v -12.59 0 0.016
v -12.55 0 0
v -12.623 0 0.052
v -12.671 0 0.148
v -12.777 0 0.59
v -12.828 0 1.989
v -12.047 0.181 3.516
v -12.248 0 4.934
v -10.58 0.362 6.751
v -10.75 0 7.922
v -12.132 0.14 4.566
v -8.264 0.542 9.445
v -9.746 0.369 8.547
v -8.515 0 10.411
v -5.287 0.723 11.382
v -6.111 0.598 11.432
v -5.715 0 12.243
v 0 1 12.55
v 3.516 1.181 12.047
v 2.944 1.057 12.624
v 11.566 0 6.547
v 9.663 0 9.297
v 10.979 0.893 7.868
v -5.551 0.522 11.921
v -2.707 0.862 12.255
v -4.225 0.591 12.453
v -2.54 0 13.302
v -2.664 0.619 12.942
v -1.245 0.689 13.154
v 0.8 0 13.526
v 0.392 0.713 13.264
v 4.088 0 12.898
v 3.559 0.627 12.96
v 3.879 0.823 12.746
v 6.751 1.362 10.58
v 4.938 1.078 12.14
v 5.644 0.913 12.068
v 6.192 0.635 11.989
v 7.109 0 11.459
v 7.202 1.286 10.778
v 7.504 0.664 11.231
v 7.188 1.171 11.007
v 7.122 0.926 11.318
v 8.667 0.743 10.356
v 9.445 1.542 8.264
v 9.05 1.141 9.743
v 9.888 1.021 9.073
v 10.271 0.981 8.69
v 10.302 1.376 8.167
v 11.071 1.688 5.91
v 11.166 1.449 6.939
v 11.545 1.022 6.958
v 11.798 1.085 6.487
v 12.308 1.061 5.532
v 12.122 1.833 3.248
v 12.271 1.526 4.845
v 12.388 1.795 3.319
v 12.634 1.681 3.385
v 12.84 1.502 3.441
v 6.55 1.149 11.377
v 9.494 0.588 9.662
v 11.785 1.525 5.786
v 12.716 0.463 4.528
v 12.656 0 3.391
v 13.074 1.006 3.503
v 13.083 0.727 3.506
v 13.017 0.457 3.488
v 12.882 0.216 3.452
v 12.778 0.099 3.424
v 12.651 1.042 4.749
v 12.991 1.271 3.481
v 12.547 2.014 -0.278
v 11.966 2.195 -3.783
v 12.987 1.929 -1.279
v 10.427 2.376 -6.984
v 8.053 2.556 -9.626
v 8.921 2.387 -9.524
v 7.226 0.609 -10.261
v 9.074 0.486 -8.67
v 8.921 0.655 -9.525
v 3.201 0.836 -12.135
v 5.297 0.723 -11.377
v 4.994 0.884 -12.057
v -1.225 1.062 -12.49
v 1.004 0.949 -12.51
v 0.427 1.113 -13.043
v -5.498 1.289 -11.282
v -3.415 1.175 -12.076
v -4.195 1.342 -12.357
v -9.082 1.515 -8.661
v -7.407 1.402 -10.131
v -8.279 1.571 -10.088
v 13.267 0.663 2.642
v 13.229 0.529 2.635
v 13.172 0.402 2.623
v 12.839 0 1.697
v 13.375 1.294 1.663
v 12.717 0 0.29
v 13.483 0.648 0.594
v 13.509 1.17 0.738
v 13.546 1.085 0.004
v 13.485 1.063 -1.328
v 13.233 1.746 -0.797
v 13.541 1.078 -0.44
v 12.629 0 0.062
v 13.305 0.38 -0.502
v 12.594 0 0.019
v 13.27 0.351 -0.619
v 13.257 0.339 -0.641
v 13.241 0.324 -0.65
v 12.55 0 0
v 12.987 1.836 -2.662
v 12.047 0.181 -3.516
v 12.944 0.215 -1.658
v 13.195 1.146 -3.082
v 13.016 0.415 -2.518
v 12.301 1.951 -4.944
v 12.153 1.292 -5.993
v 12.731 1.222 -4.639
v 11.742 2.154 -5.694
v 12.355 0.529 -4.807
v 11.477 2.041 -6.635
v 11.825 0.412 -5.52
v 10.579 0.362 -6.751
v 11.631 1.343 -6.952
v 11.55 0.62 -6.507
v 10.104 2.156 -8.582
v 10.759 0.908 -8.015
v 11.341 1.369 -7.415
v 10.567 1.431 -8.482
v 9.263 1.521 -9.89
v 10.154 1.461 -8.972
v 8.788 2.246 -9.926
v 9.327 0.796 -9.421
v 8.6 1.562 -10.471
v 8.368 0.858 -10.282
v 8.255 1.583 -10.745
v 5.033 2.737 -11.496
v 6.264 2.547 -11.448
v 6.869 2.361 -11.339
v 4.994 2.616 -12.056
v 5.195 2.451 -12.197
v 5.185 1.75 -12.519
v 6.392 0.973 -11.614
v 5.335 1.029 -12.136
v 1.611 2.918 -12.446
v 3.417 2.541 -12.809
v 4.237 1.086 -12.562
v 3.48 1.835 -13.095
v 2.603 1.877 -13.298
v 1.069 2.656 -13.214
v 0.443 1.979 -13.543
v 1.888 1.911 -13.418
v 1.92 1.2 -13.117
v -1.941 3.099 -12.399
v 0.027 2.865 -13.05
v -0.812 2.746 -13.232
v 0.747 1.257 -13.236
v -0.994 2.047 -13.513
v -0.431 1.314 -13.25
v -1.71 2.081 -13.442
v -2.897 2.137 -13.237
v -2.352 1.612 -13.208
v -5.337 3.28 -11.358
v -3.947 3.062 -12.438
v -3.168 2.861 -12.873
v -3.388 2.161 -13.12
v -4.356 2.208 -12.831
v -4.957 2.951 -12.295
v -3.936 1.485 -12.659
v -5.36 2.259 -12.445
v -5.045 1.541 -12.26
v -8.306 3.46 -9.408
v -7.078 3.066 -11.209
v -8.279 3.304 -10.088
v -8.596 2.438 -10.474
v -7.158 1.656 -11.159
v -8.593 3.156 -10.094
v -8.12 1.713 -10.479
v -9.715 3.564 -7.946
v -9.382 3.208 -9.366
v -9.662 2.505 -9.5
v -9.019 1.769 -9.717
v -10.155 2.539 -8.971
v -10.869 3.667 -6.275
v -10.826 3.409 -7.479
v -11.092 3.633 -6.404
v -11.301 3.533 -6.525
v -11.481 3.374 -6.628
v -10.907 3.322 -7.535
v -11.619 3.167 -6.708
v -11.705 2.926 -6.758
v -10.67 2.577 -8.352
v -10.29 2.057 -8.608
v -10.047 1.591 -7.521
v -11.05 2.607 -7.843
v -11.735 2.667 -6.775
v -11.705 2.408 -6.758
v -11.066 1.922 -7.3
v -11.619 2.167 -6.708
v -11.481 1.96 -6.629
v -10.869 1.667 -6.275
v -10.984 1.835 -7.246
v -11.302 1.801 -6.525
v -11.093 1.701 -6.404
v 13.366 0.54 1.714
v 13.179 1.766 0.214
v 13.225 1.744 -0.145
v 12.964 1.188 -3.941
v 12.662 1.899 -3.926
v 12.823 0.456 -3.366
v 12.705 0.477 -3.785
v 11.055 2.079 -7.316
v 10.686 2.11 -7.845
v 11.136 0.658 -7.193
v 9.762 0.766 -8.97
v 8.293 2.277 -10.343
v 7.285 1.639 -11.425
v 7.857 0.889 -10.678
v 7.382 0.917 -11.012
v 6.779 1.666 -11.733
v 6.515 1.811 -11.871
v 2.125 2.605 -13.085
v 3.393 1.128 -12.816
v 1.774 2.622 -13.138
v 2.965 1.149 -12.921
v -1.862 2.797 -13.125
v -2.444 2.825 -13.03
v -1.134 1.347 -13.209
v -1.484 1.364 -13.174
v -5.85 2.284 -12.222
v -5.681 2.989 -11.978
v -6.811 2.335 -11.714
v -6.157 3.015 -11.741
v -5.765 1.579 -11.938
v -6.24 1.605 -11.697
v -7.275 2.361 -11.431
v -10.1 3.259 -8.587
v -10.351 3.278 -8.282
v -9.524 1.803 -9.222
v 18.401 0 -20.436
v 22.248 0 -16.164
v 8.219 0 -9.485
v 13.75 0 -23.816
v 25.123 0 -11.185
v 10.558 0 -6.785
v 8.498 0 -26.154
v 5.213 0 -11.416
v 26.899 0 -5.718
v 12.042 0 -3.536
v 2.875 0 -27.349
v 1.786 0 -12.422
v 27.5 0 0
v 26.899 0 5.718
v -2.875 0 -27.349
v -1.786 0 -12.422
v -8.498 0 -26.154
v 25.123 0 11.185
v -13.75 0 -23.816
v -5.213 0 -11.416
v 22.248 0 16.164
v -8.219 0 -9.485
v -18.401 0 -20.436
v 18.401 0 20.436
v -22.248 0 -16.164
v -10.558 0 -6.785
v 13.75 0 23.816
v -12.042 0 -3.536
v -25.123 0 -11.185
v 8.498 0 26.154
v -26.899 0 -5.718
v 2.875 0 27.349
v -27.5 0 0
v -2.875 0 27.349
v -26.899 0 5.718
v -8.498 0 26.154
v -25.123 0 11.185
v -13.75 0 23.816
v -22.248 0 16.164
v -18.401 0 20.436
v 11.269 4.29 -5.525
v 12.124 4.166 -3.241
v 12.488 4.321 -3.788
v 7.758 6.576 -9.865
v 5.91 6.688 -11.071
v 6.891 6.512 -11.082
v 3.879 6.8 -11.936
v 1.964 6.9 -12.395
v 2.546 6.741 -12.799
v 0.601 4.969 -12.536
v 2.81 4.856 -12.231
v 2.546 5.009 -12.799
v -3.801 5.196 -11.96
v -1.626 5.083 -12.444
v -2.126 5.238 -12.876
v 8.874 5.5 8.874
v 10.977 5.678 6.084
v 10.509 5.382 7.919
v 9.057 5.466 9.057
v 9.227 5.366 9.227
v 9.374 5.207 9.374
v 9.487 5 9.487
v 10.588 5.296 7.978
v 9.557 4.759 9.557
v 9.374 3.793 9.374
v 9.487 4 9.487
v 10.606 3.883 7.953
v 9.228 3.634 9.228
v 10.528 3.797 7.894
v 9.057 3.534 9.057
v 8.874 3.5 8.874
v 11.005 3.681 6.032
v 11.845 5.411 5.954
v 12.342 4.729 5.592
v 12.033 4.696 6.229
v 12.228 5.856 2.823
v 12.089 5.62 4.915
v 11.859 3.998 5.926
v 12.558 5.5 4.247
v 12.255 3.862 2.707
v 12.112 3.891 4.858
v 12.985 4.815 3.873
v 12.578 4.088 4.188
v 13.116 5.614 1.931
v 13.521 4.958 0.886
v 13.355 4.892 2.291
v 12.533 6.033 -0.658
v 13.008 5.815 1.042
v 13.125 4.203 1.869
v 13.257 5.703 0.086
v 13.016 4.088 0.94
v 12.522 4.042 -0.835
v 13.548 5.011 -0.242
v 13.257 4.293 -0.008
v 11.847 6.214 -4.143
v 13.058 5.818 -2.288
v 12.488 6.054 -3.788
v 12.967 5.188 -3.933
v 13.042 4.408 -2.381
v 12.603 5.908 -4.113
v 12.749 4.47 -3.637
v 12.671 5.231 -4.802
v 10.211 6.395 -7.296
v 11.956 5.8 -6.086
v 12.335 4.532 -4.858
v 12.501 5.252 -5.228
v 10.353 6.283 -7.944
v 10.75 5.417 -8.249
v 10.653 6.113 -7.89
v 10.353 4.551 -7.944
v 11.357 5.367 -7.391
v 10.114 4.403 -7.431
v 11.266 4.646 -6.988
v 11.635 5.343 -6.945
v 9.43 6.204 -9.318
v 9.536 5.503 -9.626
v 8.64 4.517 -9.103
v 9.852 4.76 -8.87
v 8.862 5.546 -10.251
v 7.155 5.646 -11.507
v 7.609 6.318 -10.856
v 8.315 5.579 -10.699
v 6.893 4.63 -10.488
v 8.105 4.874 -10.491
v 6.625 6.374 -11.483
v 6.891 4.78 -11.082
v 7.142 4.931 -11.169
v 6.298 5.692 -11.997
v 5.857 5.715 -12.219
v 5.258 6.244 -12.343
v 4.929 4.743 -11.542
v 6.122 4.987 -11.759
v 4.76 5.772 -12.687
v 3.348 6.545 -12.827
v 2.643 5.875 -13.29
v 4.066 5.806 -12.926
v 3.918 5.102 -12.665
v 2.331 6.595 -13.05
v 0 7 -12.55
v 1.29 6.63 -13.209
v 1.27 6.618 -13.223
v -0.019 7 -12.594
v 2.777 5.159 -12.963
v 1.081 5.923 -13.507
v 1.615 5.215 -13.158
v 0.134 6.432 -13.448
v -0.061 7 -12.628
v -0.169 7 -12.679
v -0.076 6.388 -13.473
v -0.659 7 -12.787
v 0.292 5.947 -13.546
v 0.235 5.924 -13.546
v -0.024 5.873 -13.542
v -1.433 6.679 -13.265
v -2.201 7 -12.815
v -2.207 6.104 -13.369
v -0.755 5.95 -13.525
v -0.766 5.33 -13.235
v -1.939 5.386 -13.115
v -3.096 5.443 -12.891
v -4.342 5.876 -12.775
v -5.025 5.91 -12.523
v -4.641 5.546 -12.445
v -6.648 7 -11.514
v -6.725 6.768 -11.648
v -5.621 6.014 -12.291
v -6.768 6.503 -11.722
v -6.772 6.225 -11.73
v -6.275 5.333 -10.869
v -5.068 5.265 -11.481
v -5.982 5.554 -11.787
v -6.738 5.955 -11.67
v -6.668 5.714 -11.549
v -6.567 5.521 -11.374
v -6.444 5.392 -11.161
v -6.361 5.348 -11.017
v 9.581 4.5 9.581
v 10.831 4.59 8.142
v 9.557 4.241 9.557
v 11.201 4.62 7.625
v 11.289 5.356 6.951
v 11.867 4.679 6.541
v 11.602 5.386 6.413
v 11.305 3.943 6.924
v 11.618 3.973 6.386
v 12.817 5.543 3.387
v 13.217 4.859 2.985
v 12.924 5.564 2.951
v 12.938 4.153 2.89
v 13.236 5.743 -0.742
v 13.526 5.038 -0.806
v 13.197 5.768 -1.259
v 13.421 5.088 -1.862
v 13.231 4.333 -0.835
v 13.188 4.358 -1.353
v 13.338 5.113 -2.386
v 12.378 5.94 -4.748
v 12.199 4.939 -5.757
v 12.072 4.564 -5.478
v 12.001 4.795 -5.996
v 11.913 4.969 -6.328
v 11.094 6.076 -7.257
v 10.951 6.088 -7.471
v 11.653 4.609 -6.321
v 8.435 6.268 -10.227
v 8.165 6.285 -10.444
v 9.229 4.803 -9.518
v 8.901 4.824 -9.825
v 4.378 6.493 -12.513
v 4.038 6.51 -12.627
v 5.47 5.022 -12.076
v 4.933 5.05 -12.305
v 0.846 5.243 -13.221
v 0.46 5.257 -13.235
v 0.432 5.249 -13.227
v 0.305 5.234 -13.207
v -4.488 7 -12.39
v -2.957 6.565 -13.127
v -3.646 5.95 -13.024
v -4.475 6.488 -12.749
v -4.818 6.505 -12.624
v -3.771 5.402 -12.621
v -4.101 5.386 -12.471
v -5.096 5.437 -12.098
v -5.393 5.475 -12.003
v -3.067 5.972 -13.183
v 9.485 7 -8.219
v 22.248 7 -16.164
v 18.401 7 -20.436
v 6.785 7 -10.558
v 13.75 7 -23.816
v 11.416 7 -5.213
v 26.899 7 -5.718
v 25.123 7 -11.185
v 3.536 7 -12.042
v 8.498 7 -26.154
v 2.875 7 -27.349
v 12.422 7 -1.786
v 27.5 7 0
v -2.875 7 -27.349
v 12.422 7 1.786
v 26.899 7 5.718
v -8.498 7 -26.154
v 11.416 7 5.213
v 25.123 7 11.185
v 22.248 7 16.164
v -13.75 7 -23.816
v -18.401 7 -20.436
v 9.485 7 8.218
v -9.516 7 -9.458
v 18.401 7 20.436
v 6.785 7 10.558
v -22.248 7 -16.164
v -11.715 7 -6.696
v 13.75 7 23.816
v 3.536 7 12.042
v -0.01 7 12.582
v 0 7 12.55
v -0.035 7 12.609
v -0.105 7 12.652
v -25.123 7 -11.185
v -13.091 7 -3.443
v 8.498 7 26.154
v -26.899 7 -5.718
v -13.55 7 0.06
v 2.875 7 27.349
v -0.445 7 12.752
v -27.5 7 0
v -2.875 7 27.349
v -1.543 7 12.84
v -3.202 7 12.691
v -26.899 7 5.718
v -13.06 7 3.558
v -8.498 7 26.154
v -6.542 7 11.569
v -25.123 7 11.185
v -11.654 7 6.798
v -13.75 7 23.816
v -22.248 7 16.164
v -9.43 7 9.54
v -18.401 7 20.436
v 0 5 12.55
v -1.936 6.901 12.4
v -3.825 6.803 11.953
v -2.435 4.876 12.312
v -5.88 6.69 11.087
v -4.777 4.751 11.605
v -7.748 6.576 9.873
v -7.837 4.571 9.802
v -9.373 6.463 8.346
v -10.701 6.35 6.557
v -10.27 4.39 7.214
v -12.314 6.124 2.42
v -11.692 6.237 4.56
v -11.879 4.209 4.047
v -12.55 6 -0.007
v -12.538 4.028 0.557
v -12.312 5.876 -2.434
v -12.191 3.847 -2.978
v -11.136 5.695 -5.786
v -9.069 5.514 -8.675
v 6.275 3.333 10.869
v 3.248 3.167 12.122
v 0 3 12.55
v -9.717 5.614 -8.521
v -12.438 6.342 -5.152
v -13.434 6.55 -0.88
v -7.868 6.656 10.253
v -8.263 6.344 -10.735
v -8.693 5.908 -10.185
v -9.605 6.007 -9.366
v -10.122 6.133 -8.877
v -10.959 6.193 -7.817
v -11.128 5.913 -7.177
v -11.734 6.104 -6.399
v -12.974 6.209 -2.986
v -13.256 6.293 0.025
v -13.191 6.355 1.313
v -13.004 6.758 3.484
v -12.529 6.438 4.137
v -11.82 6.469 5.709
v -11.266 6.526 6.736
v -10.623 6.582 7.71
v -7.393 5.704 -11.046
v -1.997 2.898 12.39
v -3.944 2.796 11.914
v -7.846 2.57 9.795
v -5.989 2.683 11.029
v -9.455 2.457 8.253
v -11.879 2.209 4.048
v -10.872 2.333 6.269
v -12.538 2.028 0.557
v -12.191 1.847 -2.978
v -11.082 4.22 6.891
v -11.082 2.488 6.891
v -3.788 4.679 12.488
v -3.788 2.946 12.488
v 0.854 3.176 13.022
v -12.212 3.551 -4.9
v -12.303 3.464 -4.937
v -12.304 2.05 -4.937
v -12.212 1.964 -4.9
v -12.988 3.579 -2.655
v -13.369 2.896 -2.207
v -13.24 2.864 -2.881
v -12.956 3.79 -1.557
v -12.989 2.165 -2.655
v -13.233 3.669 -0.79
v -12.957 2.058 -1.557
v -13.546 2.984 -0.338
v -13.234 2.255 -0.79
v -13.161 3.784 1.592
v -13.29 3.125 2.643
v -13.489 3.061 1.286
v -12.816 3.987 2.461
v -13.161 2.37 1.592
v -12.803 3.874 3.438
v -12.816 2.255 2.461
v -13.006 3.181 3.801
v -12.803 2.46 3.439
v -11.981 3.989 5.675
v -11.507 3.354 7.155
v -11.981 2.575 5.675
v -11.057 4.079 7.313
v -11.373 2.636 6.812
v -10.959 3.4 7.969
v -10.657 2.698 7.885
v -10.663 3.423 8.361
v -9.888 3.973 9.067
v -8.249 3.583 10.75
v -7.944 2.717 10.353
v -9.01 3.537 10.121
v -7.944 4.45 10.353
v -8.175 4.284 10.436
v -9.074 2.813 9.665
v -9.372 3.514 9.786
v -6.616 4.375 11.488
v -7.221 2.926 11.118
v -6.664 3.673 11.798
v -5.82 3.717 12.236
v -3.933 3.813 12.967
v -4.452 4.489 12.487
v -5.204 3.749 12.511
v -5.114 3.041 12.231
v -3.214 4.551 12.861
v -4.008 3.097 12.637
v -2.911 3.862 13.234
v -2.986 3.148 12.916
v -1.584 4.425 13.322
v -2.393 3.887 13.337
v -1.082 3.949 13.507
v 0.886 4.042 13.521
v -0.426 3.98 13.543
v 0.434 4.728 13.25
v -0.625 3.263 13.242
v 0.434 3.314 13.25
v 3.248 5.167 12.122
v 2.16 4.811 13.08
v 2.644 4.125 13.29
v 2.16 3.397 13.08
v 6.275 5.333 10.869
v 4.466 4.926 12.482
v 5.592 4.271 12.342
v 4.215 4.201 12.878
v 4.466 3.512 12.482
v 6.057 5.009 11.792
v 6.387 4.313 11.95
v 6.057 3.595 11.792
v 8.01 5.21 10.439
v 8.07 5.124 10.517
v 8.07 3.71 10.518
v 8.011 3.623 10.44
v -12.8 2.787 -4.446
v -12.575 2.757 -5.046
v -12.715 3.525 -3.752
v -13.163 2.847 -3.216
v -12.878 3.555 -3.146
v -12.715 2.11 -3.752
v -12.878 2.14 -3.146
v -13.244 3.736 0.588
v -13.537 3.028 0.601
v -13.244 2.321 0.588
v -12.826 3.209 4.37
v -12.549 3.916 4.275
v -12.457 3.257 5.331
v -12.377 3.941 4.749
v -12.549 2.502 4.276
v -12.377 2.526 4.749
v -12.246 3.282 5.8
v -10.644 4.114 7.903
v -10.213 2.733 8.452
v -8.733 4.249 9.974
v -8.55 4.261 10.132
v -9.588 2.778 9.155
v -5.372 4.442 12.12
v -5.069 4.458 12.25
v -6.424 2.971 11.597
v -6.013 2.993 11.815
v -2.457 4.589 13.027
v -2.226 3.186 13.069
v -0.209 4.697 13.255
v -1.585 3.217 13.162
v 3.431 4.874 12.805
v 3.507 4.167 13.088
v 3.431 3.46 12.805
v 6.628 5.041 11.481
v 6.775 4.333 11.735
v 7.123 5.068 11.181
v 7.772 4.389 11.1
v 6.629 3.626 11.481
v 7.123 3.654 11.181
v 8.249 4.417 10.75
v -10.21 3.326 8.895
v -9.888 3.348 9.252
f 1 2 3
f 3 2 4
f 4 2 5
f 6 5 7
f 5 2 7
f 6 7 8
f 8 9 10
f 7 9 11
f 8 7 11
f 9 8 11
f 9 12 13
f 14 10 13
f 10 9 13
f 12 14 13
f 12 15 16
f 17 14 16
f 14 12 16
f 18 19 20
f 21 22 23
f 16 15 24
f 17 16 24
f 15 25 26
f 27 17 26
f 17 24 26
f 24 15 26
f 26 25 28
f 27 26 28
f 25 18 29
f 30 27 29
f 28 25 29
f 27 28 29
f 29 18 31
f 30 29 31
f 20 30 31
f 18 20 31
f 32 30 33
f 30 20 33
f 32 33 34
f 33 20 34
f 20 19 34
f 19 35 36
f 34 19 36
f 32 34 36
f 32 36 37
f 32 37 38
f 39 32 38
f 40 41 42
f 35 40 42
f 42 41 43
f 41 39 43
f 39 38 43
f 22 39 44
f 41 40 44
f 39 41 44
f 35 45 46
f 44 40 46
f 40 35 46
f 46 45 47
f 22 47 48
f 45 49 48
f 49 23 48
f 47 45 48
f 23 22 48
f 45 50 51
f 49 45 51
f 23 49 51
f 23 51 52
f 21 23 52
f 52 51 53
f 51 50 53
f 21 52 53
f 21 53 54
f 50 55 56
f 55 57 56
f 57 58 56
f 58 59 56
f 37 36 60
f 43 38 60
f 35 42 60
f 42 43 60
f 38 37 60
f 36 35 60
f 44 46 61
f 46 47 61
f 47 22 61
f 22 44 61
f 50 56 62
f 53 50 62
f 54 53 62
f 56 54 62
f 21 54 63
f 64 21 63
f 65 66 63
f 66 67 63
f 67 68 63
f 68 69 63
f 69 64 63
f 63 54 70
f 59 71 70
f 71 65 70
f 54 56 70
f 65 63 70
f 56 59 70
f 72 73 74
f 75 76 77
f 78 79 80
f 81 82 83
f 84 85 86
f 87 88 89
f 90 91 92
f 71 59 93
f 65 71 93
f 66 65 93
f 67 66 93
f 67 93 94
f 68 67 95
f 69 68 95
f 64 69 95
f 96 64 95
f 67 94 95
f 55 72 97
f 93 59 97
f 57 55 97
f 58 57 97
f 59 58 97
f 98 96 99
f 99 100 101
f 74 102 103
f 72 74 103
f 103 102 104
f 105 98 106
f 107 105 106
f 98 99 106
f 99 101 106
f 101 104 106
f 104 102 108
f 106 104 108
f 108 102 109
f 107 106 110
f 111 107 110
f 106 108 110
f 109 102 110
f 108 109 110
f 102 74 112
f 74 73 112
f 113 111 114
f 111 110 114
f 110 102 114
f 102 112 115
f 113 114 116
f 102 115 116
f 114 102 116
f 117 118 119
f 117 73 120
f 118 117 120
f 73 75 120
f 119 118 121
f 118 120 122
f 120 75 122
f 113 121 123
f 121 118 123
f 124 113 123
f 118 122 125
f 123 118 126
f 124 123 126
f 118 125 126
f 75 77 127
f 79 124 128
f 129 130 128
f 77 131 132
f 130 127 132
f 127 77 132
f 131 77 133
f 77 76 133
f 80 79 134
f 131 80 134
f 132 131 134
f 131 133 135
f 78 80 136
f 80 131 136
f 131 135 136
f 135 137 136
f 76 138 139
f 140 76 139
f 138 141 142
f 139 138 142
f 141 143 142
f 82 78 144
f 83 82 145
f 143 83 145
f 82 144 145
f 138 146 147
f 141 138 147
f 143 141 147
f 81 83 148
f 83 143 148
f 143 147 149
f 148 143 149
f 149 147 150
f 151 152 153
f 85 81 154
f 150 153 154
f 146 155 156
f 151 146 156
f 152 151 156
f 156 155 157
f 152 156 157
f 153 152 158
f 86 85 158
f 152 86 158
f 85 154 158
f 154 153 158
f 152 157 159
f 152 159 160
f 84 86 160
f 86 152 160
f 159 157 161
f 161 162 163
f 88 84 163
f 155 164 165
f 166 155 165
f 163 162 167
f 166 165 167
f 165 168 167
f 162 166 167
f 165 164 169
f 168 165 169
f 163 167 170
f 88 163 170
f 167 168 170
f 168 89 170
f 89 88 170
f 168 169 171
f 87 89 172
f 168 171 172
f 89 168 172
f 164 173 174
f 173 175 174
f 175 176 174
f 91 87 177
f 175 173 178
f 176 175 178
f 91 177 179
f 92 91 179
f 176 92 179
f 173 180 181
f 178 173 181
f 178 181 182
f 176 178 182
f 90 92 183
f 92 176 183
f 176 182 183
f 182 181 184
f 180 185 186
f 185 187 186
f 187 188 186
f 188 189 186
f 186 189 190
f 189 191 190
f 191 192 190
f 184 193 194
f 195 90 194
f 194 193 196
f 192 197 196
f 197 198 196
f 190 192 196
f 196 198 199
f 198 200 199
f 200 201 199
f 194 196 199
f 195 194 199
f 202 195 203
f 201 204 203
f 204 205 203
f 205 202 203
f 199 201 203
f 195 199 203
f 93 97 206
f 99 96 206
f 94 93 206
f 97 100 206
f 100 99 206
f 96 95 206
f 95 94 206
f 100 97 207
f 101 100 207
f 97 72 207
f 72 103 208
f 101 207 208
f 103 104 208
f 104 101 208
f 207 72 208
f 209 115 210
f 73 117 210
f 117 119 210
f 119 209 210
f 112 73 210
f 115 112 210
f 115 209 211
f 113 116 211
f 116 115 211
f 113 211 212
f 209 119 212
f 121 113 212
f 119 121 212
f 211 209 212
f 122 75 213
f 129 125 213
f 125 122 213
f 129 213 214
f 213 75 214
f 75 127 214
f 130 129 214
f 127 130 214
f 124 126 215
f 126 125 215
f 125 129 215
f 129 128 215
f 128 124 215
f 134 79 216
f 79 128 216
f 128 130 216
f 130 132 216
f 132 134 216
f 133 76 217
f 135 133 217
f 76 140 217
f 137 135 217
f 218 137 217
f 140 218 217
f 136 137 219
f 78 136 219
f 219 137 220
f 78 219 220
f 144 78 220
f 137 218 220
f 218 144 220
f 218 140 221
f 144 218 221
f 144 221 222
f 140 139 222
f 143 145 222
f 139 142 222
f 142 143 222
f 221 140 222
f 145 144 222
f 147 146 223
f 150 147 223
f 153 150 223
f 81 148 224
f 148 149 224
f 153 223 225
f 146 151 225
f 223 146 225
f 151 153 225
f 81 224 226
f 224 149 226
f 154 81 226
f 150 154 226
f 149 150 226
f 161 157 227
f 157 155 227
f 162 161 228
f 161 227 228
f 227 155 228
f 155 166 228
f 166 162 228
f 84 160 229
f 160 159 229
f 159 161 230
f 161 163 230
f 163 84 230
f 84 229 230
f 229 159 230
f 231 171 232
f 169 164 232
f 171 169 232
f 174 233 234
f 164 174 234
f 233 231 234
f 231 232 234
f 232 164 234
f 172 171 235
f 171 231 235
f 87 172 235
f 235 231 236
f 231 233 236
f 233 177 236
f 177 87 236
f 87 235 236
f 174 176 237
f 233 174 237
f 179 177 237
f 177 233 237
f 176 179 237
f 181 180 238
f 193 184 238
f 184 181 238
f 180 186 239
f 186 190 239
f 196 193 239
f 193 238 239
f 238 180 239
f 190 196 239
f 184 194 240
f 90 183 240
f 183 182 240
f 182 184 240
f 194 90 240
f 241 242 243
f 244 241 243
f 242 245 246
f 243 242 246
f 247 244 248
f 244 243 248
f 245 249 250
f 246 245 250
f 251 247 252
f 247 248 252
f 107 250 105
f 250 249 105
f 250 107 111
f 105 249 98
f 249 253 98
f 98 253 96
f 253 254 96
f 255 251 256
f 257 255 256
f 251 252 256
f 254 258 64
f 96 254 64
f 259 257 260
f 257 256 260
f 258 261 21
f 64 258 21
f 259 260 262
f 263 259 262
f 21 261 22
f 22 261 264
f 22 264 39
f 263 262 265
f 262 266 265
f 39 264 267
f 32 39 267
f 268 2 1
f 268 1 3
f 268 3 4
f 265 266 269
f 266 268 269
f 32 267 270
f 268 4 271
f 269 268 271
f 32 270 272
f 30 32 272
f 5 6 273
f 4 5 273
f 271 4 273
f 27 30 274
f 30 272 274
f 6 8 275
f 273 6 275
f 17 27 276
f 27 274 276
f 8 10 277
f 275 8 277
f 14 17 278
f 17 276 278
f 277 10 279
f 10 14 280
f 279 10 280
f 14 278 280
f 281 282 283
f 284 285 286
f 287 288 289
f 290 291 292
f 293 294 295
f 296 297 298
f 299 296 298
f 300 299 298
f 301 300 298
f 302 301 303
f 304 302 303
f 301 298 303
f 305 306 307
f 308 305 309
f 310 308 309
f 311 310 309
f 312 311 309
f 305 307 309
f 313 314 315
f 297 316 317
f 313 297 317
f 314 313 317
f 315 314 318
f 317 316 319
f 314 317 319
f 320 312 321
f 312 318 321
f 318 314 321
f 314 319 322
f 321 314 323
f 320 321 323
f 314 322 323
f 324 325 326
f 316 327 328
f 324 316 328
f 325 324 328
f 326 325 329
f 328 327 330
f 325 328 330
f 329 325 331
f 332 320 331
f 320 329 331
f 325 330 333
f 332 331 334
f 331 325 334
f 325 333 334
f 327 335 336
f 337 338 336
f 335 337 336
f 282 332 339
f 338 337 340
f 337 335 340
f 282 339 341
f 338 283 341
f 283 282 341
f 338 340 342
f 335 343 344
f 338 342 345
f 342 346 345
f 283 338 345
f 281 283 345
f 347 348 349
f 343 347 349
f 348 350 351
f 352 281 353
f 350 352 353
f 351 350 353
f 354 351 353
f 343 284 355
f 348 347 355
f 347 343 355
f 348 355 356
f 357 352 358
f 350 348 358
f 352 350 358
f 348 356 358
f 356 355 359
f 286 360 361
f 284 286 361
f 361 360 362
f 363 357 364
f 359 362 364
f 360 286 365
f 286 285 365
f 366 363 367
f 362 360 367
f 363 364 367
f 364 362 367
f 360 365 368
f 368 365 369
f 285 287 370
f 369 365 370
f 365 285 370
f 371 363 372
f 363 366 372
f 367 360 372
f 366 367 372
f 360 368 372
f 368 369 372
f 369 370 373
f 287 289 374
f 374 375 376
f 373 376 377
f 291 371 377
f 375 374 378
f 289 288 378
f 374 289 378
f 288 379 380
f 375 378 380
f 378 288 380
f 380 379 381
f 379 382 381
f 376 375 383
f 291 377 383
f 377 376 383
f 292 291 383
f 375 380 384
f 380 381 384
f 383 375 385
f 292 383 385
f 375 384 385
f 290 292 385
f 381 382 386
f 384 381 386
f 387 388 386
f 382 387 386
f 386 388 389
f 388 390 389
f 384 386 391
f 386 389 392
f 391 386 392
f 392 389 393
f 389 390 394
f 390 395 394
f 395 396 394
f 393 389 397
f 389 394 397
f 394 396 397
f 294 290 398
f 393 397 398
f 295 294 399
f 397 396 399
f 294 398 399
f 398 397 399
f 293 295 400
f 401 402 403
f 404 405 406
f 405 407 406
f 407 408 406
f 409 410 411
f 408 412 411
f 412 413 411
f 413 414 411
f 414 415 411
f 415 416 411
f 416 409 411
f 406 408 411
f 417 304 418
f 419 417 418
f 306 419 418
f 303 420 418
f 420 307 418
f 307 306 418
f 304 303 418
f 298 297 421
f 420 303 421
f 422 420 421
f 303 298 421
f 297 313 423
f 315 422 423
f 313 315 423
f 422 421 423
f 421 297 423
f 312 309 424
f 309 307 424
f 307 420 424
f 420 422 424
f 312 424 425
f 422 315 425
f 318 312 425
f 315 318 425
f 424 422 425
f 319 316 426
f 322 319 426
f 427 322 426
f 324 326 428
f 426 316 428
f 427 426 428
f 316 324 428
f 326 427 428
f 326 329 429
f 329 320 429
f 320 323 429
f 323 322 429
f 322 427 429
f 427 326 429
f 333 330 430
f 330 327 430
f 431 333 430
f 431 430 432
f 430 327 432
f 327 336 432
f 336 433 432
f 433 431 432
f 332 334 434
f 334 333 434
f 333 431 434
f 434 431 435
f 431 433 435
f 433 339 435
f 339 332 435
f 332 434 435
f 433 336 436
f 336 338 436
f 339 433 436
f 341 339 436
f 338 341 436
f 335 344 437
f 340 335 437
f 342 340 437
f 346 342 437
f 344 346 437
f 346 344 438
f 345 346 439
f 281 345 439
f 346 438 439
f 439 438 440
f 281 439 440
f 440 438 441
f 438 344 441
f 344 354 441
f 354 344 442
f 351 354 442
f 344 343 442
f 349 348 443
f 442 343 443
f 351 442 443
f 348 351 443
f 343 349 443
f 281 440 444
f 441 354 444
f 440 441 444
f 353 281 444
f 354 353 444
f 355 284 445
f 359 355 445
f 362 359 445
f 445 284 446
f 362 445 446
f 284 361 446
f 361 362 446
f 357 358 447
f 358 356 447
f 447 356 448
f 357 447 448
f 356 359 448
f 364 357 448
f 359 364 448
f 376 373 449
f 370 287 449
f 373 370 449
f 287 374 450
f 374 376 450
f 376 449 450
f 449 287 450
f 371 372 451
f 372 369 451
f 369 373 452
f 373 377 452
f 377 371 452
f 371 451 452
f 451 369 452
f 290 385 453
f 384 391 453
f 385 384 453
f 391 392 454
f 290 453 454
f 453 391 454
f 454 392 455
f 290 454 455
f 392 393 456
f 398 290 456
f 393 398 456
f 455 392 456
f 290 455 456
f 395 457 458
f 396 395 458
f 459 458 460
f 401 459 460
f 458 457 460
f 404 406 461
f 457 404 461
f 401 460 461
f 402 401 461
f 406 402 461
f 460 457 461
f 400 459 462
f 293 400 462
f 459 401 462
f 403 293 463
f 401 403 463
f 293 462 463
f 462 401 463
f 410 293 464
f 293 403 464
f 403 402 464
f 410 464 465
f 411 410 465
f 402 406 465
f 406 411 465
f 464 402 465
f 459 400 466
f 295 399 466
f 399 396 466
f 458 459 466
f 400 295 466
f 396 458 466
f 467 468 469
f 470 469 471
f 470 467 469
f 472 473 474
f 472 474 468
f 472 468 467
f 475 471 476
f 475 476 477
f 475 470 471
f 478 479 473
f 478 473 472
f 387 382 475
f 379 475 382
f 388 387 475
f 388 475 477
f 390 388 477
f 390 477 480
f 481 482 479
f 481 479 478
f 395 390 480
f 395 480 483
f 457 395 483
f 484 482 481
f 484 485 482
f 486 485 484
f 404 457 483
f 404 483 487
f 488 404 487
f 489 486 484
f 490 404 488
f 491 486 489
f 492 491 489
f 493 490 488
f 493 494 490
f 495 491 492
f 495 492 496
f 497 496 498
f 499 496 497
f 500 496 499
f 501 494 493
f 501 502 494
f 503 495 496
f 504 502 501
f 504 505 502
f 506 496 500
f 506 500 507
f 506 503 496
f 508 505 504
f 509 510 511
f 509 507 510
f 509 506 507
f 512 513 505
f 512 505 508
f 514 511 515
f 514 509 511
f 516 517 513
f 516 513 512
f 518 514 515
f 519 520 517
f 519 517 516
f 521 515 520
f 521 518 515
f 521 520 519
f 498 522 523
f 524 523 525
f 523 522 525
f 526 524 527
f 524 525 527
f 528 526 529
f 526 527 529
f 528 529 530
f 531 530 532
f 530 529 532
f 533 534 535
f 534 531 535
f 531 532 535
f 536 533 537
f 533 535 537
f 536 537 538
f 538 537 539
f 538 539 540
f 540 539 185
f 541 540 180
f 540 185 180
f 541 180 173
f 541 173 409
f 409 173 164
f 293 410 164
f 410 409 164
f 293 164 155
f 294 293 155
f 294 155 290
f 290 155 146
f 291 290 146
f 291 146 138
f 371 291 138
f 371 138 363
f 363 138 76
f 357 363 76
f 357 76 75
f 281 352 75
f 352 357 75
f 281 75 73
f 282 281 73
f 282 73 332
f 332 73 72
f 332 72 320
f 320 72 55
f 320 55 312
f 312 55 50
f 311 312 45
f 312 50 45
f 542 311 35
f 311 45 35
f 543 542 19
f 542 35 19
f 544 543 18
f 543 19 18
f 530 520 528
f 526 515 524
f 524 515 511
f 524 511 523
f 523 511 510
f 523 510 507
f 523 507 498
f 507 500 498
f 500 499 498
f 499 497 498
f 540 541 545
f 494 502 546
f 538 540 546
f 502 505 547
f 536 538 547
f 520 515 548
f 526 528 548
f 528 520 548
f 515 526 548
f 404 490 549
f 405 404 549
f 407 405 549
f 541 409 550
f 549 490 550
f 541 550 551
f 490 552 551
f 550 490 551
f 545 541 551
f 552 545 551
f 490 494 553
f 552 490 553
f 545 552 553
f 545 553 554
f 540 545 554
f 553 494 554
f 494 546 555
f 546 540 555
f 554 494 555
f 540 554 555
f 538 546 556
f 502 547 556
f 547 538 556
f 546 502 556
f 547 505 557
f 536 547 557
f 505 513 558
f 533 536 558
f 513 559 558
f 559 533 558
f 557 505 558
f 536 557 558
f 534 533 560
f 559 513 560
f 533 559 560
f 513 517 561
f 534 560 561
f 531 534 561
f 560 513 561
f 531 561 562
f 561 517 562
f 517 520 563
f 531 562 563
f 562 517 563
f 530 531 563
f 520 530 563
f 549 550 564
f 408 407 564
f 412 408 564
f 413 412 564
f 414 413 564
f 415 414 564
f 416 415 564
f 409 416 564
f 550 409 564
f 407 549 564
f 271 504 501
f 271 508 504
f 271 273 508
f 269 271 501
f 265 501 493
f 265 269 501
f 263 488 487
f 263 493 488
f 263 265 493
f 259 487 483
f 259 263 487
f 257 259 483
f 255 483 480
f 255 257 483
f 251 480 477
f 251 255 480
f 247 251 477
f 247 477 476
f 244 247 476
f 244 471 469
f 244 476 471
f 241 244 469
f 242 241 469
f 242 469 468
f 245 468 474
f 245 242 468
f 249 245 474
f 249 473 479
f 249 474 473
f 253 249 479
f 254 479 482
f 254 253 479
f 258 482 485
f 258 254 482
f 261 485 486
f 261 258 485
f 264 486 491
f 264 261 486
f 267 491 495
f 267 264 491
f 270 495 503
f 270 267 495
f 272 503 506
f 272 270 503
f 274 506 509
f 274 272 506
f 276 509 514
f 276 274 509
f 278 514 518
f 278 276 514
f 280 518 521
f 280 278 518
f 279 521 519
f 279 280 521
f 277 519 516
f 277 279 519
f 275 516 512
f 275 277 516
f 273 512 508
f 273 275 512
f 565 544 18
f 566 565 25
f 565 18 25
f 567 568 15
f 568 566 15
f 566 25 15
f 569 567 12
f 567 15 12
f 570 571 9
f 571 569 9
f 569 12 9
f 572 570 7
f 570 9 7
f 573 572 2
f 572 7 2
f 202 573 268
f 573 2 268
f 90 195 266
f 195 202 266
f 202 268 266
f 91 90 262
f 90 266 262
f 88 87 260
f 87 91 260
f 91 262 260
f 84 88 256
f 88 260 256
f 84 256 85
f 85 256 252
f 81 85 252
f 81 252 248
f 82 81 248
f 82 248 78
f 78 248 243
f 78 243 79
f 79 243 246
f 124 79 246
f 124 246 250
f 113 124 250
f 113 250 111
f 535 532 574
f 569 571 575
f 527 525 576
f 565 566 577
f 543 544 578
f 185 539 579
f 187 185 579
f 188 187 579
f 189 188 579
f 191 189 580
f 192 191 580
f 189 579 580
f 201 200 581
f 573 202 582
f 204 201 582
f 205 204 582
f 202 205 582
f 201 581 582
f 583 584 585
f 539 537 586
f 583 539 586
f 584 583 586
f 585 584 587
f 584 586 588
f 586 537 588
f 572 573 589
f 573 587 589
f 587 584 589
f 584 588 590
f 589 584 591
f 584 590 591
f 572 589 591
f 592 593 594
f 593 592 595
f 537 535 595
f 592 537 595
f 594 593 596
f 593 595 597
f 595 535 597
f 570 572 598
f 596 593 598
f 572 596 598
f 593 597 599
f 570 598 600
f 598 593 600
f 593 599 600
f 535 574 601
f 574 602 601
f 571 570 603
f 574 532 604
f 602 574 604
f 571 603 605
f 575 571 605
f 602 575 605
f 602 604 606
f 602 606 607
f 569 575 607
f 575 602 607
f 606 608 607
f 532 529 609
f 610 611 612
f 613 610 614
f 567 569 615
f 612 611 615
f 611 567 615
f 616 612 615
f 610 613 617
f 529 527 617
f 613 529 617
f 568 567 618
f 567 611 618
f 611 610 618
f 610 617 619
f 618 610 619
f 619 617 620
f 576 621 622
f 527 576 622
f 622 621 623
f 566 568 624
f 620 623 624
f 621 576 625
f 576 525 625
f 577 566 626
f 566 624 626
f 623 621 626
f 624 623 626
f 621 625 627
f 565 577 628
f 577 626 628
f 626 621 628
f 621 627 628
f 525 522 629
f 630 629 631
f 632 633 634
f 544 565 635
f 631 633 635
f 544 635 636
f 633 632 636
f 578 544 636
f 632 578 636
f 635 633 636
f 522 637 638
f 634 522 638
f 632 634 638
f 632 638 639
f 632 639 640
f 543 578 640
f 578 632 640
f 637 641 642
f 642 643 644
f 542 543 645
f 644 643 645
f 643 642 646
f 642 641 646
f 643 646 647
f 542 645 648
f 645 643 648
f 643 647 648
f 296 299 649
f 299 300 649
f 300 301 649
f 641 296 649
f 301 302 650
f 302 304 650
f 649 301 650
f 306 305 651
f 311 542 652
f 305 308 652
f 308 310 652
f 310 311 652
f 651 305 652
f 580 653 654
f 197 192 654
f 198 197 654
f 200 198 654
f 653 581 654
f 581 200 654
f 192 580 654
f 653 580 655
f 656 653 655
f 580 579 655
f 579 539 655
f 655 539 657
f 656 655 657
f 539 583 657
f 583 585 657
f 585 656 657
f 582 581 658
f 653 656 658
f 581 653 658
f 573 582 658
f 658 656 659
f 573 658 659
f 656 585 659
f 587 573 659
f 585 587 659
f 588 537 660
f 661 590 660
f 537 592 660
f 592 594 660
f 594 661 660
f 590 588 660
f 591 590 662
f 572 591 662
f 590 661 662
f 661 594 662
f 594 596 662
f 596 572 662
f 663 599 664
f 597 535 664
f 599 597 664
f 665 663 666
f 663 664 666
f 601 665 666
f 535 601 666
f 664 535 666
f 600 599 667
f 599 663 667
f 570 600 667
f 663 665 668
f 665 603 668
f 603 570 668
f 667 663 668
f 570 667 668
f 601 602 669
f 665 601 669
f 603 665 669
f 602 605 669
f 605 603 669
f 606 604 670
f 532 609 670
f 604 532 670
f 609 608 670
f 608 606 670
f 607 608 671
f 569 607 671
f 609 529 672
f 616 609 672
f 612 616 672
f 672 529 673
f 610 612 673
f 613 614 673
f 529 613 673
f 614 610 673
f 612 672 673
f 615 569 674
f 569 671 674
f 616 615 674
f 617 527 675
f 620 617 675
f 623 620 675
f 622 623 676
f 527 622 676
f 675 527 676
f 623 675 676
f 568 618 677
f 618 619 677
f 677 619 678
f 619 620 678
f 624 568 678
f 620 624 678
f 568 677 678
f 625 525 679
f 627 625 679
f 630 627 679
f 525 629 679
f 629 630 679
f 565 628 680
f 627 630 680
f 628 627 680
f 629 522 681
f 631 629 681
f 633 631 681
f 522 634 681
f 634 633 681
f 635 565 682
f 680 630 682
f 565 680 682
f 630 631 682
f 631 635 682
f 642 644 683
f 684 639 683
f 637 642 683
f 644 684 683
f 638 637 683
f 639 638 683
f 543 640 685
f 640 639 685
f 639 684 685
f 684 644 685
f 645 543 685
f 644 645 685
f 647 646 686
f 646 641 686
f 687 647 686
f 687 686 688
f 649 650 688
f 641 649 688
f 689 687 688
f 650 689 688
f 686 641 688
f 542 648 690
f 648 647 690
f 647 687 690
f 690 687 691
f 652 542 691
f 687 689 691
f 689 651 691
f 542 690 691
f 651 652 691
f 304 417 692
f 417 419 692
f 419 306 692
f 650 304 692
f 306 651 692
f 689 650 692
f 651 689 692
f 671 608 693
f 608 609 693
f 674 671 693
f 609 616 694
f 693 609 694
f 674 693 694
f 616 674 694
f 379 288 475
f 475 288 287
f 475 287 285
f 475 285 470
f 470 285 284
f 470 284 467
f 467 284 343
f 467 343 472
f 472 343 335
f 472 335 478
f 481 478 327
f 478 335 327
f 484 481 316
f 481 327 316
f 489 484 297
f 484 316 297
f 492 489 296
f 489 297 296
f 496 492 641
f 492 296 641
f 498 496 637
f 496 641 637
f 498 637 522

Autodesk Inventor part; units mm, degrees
ref_plane "YZ Plane" through (0, 0, 0) normal (1, 0, 0) x (0, 1, 0)
ref_plane "XZ Plane" through (0, 0, 0) normal (0, 1, 0) x (-1, 0, 0)
ref_plane "XY Plane" through (0, 0, 0) normal (0, 0, 1) x (1, 0, 0)
sketch "Sketch1" plane through (0, 0, 0) normal (0, 1, 0) x (-1, 0, 0)
  circle A0 centre (0, 0) radius 27.5
  dimension "d0" = 55
extrude "Extrusion1" add sketch "Sketch1" along normal blind 7
sketch "Sketch2" plane through (0, 7, 0) normal (0, 1, 0) x (1, 0, 0)
  circle A0 centre (0, 0) radius 27.5 projected
hole "Hole1" at (0, 7, 0) direction (0, -1, 0) diameter 25.1 end through all
sketch "Sketch9" plane through (0, 0, 0) normal (0, 0, 1) x (1, 0, 0)
  circle A0 centre (-12.55, -1) radius 1
  line L0 (12.55, 0) -> (-12.55, 0) projected
  point P0 (0, 0)
  dimension "d52" = 2
  dimension "d53" = 1
coil "Coil4" sketch "Sketch9" operation cut axis through (0, -10, 0) along (0, 1, 0) pitch 4 turns 2.75 hand right
properties part number "screwspoolv2"
